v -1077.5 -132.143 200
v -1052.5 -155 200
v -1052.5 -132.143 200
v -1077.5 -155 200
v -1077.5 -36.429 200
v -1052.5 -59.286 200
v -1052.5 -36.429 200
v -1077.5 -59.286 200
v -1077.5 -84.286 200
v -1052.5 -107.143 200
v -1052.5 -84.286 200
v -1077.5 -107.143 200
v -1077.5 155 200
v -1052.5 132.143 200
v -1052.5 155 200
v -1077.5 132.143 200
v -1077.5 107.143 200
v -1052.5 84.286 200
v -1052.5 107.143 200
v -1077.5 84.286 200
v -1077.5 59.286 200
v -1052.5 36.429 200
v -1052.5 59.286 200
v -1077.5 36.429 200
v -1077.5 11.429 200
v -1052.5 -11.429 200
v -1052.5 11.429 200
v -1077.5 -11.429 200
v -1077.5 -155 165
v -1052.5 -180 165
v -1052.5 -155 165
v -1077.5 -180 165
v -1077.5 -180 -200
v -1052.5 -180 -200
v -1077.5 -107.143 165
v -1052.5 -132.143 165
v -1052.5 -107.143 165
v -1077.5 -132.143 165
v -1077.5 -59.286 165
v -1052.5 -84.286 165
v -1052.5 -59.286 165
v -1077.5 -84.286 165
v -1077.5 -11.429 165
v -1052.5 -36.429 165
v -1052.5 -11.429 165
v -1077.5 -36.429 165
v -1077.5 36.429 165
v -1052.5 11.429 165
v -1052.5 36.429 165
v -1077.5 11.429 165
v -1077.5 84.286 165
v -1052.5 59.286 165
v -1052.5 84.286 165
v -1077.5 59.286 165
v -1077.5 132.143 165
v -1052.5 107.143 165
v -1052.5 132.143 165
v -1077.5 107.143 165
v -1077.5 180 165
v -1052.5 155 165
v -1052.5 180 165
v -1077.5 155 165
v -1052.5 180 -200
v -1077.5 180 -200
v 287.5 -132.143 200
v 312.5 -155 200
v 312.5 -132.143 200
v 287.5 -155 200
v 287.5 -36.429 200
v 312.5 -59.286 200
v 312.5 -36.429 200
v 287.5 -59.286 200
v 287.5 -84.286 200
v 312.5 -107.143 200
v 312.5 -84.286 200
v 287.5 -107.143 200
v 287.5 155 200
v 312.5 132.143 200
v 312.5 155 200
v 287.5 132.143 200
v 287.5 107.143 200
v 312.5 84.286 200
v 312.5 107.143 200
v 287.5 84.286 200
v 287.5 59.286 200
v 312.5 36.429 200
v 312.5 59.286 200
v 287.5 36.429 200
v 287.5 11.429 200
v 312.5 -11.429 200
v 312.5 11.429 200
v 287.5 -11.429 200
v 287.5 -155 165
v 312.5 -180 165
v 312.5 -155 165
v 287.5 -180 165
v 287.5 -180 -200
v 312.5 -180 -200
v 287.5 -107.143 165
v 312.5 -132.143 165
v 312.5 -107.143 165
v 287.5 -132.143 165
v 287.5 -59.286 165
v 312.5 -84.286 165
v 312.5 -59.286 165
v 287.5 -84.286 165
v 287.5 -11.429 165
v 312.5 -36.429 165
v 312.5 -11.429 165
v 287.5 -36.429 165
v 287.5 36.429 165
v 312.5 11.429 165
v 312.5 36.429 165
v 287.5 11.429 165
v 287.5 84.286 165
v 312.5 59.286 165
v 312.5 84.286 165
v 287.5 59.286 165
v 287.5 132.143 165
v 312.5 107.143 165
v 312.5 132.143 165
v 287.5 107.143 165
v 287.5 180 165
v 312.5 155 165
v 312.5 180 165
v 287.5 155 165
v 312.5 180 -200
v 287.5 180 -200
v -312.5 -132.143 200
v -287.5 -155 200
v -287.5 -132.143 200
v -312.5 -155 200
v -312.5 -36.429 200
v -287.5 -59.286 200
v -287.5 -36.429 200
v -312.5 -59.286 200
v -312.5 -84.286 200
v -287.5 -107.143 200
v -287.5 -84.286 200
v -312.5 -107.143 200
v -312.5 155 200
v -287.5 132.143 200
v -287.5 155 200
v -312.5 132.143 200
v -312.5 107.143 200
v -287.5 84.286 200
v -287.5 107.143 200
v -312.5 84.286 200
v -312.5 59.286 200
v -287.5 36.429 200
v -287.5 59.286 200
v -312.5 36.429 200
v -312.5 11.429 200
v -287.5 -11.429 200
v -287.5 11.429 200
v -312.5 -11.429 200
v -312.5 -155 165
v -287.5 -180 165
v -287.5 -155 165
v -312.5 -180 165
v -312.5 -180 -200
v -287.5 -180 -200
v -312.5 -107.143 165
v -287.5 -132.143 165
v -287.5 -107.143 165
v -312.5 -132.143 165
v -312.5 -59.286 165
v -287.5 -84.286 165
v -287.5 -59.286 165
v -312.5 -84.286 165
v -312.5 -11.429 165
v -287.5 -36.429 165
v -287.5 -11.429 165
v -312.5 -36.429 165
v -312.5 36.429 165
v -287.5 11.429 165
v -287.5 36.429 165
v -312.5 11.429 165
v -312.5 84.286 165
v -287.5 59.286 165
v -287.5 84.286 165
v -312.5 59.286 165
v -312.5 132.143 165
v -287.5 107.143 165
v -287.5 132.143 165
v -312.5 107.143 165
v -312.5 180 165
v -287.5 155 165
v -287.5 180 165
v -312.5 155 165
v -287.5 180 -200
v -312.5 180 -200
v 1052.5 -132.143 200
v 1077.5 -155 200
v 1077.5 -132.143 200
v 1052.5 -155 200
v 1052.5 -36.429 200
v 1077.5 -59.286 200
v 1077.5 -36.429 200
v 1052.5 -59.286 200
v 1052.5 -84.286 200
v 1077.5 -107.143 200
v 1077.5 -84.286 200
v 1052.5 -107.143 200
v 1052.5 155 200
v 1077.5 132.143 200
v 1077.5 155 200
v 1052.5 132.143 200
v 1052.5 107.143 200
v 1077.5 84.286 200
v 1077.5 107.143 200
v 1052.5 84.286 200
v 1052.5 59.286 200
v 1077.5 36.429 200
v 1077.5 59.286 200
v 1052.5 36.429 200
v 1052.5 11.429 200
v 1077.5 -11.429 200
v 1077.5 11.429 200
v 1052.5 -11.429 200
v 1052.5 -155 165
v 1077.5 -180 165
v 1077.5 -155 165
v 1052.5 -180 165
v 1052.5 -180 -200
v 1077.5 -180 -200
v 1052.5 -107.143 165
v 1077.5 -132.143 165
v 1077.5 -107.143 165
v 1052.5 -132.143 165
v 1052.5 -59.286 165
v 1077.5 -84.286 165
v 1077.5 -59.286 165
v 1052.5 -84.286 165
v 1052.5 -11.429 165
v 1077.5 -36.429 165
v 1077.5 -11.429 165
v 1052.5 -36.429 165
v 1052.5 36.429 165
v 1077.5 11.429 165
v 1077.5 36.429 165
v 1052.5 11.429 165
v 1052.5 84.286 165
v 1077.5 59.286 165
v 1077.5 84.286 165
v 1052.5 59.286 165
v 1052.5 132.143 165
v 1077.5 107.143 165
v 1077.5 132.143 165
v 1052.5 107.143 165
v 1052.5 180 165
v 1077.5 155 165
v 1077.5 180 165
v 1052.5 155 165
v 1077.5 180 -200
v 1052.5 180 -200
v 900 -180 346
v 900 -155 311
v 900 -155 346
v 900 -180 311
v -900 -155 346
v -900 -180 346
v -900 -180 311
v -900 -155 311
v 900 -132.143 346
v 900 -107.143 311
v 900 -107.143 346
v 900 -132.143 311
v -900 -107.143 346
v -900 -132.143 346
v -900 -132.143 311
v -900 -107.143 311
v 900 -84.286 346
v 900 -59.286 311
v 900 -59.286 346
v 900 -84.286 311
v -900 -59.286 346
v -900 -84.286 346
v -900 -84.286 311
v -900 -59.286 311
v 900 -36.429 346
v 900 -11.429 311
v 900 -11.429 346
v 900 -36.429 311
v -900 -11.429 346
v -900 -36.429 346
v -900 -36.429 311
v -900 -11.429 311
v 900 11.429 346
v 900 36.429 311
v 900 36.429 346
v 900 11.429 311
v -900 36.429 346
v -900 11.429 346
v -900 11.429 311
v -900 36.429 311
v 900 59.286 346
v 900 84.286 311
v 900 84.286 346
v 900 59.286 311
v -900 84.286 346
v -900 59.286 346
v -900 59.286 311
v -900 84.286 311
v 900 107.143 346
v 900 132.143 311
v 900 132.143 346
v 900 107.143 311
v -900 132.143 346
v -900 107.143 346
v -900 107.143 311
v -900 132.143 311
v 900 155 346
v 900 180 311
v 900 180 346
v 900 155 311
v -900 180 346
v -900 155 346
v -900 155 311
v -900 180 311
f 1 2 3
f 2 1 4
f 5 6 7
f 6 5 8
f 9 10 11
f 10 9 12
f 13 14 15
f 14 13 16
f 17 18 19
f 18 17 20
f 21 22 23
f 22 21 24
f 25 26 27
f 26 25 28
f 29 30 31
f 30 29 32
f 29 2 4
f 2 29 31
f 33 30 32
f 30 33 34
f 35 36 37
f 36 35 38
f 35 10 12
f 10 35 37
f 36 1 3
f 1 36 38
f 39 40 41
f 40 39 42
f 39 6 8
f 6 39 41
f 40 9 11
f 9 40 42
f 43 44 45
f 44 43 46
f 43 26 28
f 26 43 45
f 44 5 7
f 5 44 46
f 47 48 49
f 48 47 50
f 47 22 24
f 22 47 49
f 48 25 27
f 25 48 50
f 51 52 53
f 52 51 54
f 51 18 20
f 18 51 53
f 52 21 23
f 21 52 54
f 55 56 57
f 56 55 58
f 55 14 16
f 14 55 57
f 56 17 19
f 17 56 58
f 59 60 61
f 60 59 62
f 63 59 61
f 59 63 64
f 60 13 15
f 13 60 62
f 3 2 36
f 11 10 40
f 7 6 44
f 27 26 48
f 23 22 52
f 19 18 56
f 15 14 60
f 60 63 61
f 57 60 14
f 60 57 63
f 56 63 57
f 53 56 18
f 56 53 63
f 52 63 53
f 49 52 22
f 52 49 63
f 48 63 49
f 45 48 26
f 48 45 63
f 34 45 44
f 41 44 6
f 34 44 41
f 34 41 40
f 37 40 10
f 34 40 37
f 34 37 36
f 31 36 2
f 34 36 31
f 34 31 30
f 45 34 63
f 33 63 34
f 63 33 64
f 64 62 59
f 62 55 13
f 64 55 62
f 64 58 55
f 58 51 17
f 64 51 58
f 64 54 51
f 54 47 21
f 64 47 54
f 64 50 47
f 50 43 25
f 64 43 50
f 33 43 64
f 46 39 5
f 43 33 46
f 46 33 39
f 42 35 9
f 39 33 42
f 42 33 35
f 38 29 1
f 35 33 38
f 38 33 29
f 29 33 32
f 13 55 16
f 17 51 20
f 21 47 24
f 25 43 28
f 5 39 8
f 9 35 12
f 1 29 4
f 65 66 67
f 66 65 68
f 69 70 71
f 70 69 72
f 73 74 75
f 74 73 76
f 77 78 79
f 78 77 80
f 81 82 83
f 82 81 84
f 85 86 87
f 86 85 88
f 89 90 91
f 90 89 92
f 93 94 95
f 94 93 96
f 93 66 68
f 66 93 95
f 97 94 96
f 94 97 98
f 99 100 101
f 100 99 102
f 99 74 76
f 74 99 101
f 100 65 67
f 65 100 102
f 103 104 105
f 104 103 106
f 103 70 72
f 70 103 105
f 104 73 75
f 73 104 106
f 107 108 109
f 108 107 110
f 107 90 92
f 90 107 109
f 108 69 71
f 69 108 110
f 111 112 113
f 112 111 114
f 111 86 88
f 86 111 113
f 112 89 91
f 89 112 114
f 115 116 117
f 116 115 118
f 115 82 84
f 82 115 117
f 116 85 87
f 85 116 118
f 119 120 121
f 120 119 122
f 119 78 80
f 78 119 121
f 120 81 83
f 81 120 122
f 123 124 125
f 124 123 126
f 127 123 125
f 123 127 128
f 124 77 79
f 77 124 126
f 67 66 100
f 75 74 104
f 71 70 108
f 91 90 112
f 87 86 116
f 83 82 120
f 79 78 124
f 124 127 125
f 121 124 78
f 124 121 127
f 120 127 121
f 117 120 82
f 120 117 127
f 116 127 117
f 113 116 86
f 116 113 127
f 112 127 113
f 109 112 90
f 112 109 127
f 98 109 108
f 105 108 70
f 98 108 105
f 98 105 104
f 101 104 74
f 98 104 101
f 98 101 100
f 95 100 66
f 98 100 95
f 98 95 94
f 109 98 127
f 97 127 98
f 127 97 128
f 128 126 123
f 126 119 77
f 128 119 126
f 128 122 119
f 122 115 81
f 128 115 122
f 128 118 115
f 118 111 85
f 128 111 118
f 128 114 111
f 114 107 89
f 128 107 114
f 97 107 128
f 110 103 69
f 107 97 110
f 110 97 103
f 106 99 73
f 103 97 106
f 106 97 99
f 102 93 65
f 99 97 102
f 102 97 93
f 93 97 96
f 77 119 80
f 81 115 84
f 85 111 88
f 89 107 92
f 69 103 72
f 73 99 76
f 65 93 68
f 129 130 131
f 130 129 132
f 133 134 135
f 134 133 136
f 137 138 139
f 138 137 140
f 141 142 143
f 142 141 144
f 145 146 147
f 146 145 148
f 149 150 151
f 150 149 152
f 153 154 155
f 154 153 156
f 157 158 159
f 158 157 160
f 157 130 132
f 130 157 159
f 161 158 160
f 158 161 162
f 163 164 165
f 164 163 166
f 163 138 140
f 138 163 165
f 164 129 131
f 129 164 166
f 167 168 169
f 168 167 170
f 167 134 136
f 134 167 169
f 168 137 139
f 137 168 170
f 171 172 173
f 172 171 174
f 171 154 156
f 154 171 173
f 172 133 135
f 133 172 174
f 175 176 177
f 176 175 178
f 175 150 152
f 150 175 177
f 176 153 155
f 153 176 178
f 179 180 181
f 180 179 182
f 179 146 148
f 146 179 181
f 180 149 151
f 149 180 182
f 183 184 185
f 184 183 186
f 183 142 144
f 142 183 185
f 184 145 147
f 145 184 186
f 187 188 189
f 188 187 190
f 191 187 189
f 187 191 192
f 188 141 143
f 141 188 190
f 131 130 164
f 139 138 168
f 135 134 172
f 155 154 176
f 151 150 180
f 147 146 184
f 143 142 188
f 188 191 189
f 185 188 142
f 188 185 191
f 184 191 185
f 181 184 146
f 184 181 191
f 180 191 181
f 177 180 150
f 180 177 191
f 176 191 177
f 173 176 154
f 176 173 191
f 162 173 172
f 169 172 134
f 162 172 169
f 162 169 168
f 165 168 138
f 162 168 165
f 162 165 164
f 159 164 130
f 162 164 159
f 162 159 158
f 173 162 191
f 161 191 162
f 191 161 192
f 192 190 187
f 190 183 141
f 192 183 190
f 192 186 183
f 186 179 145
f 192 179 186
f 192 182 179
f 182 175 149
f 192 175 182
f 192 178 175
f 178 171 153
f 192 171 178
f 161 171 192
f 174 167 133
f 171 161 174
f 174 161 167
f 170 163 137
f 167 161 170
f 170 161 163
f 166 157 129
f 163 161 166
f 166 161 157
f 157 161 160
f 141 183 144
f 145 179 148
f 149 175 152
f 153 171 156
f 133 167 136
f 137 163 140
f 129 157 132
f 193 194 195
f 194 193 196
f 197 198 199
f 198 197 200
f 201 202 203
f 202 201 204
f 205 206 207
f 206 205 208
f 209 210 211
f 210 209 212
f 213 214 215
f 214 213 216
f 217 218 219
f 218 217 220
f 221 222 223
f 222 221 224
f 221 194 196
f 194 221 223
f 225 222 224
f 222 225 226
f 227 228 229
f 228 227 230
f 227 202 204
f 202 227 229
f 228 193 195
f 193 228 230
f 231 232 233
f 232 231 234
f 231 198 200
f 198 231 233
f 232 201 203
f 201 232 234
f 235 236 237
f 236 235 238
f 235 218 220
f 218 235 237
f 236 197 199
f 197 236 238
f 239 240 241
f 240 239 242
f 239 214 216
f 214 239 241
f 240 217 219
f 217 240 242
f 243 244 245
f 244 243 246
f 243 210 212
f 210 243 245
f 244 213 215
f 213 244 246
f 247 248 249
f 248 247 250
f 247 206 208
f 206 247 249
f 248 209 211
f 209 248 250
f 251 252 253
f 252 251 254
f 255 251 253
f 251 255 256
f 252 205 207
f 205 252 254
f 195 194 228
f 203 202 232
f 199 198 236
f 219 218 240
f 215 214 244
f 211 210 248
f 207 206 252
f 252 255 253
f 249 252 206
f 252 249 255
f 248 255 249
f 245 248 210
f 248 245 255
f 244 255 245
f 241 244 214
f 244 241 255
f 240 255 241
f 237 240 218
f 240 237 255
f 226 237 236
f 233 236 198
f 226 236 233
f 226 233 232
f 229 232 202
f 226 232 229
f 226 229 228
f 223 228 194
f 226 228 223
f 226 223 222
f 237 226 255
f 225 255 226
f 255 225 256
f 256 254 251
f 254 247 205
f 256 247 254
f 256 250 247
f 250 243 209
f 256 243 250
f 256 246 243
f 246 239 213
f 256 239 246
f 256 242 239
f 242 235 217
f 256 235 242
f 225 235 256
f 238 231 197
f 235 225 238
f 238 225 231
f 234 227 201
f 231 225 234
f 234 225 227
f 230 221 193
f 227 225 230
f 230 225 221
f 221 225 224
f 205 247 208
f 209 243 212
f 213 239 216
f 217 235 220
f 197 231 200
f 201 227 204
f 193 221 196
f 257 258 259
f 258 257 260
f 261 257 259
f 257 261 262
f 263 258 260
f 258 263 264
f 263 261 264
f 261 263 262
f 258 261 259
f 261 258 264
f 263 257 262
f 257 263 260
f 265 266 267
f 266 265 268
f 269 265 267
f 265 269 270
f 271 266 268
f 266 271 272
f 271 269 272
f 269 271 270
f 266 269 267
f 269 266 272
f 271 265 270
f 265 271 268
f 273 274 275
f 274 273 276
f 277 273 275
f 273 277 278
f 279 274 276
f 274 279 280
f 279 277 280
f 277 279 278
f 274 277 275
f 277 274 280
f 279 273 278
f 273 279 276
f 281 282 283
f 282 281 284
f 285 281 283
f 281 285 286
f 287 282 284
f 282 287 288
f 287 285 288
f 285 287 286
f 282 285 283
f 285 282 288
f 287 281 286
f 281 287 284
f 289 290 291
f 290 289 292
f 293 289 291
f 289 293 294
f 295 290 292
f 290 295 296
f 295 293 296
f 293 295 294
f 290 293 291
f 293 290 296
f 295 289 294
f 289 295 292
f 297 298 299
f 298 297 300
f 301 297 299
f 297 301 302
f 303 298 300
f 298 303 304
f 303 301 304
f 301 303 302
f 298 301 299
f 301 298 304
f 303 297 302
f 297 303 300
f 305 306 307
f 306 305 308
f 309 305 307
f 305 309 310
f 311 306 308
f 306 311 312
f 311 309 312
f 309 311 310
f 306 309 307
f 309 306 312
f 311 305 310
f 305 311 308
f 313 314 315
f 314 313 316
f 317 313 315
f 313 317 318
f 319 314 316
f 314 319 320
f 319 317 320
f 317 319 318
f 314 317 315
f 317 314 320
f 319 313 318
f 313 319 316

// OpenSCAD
// file: atis_lib.scad
module gyuru(r1, r2,h, w, center=false){
    difference(){
        cylinder(r1=r1,r2=r2,h, center=center, $fn=12*r1);
        cylinder(r1=r1-w, r2=r2-w,h, center=center, $fn=12*(r1-w));
    }
}

//inset_width= min(nozzle dia/2, 0.4)
module inset_first_layer(inset_height=0.31,inset_width=0.2, render=false)
{   
    if (render == true){
        difference()
        { 
            children();

            translate([0,0,-1])
            linear_extrude(height=inset_height+1)
            difference()
            {
                offset(r = inset_width) 
                projection(cut=true) 
                translate([0,0,-inset_height])
                children();

                offset(r = -inset_width) 
                projection(cut=true) 
                translate([0,0,-inset_height])
                children();
            }
        } 
    }
    else{
        echo("Inset not rendered!");
    }
} 

module deszka(m, sz, v, vastagsag, cimke){
    cube([m,sz,v], center=true);
    if (m == vastagsag){
        t = sz * v;
        echo(cimke, m , sz, v, t/1000/1000);
    } else if (sz == vastagsag){
            t = m*v;
            echo(cimke, m , sz, v, t/1000/1000);
    } else if (v == vastagsag){
            t = m*sz;
            echo(cimke, m , sz, v, t/1000/1000);
    }
    //echo(cimke, m , sz, v, t);
}



// csm=[melyseg, szelesseg, magassag, also resz magassag, ,henger sugara

//csatlakozo([5,10,20,2,2,1.5]);

module csatlakozo(csm){
    cw = csm[0];
    sz = csm[1];
    h = csm[2];
    ch = csm[3];
    ny = csm[4];
    R=csm[5];
    translate([-cw/2, -sz/2, -h/2]){
        cube([cw,sz,ch]);
        translate([0,sz,ch])
            rotate([90,0,0])
                linear_extrude(height=sz)polygon([[0,0], [cw, 0], [0,cw+1], [0,0]]);
        translate([0,(sz-ny)/2,0])
        intersection()
        {
            translate([0,R+ny/2,0])
                rotate([90,0,0])
                    linear_extrude(height=2*R)polygon([[0,0], [cw, 0], [cw, h-cw-1], [0,h], [0,0]]);
            union(){
                cube([ny, ny,h]);
                translate([cw-R-0.5,ny/2,0]) cylinder(r=R, h=h,$fn=80);
            }
        }
    }
}

module gombolyitett_csatlakozo(csm){
    cw = csm[0]-1;
    sz = csm[1]-2;
    h = csm[2]-2;
    ch = csm[3];
    ny = csm[4];
    R=csm[5];
    translate([-cw/2, -sz/2, -h/2]){
        cube([cw,sz,ch]);
        translate([0,sz,ch])
            rotate([90,0,0])
                linear_extrude(height=sz)polygon([[0,0], [cw, 0], [0,cw+1], [0,0]]);
        translate([0,(sz-ny)/2,0])
        intersection()
        {
            translate([0,R+ny/2,0])
                rotate([90,0,0])
                    linear_extrude(height=2*R)polygon([[0,0], [cw, 0], [cw, h-cw-1], [0,h], [0,0]]);
            union(){
                cube([ny, ny,h]);
                translate([cw-R-0.5,ny/2,0]) cylinder(r=R, h=h,$fn=80);
            }
        }
    }
}
// main file
use <atis_lib.scad>

//minden adat mm-ben
pad_szelesseg = 1800;
pad_magassag = 400;
pad_melyseg = 360; // Ez csak egy maximum
av=35;
lab_vastagsag = 25;
lec_vastagsag = 25  ;

//pad_model(true);

/* Az ülőrészen lécből mindig 1-gyel több kell mint résből, ezért a pad mélységét mindig páratlan részre kell felosztani. A szélén éppen fedésben kell lennie a lécnek, ezért a pad_melyseg paramétert csak maximális értékként kezeljük. A pm lesz a kalkulált mélység, amivel a pad normálisan néz ki.
   A páratlanság miatt legrosszabb esetben a pad majdnem 2 lec_vastagsággal  lesz keskenyebb mint a pad_melyseg.

pm = (round(pad_melyseg/lec_vastagsag/2)*2-1)*lec_vastagsag;
*/

/* Az ülőrész lécei közötti réseket lehet csökkenteni. Általában néhány mm elég. Ebben az esetben a pad mélysége a megadott méret lesz.
*/

pm=pad_melyseg;
lec_no = ceil(pad_melyseg/2/lec_vastagsag);

res_sz = (pad_melyseg - lec_no*lec_vastagsag)/(lec_no-1);

pad_robbantott_abra(true, rf=[1.2, 1, 1.8]);

module pad_model(kozepso_lab=false){
    pad_robbantott_abra(kozepso_lab);
}

module pad_lab(){
    difference(){
        cube([lab_vastagsag, pm, pad_magassag], center=true);
        for(y = [-(pm-lec_vastagsag)/2:lec_vastagsag+res_sz:pm/2]){
            translate([0, y, (pad_magassag-av)/2])cube([av, lec_vastagsag,av], center=true);
        }
    }

    
}

module pad_lec(){
    cube([pad_szelesseg, lec_vastagsag, av], center=true);
}

module pad_robbantott_abra(kozepso_lab=false, rf=[1,1,1])
{
    echo("Padláb");
    echo("Magasság:", pad_magassag);
    echo("Vastagság:", lab_vastagsag);
    echo("Mélység:", pm);
    echo("Hézag szélesség:", res_sz);
    echo("Hézeg mélység:", av);
    echo("Kivágás szélesség:", lec_vastagsag);
    rfx=rf[0];
    rfy=rf[1];
    rfz=rf[2];
    translate([-(pad_szelesseg-lab_vastagsag)/2*rfx,0,0])pad_lab();
    if (kozepso_lab){
        translate([pad_szelesseg/6,0,0])pad_lab();
        translate([-pad_szelesseg/6,0,0])pad_lab();
    }
    translate([(pad_szelesseg-lab_vastagsag)/2*rfx, 0, 0])pad_lab();
    for(y = [-pm/2:lec_vastagsag+res_sz:pm/2-1]){
        translate([0, (y+lec_vastagsag/2)*rfy, (pad_magassag-av)/2*rfz]) pad_lec();
    }
}   
